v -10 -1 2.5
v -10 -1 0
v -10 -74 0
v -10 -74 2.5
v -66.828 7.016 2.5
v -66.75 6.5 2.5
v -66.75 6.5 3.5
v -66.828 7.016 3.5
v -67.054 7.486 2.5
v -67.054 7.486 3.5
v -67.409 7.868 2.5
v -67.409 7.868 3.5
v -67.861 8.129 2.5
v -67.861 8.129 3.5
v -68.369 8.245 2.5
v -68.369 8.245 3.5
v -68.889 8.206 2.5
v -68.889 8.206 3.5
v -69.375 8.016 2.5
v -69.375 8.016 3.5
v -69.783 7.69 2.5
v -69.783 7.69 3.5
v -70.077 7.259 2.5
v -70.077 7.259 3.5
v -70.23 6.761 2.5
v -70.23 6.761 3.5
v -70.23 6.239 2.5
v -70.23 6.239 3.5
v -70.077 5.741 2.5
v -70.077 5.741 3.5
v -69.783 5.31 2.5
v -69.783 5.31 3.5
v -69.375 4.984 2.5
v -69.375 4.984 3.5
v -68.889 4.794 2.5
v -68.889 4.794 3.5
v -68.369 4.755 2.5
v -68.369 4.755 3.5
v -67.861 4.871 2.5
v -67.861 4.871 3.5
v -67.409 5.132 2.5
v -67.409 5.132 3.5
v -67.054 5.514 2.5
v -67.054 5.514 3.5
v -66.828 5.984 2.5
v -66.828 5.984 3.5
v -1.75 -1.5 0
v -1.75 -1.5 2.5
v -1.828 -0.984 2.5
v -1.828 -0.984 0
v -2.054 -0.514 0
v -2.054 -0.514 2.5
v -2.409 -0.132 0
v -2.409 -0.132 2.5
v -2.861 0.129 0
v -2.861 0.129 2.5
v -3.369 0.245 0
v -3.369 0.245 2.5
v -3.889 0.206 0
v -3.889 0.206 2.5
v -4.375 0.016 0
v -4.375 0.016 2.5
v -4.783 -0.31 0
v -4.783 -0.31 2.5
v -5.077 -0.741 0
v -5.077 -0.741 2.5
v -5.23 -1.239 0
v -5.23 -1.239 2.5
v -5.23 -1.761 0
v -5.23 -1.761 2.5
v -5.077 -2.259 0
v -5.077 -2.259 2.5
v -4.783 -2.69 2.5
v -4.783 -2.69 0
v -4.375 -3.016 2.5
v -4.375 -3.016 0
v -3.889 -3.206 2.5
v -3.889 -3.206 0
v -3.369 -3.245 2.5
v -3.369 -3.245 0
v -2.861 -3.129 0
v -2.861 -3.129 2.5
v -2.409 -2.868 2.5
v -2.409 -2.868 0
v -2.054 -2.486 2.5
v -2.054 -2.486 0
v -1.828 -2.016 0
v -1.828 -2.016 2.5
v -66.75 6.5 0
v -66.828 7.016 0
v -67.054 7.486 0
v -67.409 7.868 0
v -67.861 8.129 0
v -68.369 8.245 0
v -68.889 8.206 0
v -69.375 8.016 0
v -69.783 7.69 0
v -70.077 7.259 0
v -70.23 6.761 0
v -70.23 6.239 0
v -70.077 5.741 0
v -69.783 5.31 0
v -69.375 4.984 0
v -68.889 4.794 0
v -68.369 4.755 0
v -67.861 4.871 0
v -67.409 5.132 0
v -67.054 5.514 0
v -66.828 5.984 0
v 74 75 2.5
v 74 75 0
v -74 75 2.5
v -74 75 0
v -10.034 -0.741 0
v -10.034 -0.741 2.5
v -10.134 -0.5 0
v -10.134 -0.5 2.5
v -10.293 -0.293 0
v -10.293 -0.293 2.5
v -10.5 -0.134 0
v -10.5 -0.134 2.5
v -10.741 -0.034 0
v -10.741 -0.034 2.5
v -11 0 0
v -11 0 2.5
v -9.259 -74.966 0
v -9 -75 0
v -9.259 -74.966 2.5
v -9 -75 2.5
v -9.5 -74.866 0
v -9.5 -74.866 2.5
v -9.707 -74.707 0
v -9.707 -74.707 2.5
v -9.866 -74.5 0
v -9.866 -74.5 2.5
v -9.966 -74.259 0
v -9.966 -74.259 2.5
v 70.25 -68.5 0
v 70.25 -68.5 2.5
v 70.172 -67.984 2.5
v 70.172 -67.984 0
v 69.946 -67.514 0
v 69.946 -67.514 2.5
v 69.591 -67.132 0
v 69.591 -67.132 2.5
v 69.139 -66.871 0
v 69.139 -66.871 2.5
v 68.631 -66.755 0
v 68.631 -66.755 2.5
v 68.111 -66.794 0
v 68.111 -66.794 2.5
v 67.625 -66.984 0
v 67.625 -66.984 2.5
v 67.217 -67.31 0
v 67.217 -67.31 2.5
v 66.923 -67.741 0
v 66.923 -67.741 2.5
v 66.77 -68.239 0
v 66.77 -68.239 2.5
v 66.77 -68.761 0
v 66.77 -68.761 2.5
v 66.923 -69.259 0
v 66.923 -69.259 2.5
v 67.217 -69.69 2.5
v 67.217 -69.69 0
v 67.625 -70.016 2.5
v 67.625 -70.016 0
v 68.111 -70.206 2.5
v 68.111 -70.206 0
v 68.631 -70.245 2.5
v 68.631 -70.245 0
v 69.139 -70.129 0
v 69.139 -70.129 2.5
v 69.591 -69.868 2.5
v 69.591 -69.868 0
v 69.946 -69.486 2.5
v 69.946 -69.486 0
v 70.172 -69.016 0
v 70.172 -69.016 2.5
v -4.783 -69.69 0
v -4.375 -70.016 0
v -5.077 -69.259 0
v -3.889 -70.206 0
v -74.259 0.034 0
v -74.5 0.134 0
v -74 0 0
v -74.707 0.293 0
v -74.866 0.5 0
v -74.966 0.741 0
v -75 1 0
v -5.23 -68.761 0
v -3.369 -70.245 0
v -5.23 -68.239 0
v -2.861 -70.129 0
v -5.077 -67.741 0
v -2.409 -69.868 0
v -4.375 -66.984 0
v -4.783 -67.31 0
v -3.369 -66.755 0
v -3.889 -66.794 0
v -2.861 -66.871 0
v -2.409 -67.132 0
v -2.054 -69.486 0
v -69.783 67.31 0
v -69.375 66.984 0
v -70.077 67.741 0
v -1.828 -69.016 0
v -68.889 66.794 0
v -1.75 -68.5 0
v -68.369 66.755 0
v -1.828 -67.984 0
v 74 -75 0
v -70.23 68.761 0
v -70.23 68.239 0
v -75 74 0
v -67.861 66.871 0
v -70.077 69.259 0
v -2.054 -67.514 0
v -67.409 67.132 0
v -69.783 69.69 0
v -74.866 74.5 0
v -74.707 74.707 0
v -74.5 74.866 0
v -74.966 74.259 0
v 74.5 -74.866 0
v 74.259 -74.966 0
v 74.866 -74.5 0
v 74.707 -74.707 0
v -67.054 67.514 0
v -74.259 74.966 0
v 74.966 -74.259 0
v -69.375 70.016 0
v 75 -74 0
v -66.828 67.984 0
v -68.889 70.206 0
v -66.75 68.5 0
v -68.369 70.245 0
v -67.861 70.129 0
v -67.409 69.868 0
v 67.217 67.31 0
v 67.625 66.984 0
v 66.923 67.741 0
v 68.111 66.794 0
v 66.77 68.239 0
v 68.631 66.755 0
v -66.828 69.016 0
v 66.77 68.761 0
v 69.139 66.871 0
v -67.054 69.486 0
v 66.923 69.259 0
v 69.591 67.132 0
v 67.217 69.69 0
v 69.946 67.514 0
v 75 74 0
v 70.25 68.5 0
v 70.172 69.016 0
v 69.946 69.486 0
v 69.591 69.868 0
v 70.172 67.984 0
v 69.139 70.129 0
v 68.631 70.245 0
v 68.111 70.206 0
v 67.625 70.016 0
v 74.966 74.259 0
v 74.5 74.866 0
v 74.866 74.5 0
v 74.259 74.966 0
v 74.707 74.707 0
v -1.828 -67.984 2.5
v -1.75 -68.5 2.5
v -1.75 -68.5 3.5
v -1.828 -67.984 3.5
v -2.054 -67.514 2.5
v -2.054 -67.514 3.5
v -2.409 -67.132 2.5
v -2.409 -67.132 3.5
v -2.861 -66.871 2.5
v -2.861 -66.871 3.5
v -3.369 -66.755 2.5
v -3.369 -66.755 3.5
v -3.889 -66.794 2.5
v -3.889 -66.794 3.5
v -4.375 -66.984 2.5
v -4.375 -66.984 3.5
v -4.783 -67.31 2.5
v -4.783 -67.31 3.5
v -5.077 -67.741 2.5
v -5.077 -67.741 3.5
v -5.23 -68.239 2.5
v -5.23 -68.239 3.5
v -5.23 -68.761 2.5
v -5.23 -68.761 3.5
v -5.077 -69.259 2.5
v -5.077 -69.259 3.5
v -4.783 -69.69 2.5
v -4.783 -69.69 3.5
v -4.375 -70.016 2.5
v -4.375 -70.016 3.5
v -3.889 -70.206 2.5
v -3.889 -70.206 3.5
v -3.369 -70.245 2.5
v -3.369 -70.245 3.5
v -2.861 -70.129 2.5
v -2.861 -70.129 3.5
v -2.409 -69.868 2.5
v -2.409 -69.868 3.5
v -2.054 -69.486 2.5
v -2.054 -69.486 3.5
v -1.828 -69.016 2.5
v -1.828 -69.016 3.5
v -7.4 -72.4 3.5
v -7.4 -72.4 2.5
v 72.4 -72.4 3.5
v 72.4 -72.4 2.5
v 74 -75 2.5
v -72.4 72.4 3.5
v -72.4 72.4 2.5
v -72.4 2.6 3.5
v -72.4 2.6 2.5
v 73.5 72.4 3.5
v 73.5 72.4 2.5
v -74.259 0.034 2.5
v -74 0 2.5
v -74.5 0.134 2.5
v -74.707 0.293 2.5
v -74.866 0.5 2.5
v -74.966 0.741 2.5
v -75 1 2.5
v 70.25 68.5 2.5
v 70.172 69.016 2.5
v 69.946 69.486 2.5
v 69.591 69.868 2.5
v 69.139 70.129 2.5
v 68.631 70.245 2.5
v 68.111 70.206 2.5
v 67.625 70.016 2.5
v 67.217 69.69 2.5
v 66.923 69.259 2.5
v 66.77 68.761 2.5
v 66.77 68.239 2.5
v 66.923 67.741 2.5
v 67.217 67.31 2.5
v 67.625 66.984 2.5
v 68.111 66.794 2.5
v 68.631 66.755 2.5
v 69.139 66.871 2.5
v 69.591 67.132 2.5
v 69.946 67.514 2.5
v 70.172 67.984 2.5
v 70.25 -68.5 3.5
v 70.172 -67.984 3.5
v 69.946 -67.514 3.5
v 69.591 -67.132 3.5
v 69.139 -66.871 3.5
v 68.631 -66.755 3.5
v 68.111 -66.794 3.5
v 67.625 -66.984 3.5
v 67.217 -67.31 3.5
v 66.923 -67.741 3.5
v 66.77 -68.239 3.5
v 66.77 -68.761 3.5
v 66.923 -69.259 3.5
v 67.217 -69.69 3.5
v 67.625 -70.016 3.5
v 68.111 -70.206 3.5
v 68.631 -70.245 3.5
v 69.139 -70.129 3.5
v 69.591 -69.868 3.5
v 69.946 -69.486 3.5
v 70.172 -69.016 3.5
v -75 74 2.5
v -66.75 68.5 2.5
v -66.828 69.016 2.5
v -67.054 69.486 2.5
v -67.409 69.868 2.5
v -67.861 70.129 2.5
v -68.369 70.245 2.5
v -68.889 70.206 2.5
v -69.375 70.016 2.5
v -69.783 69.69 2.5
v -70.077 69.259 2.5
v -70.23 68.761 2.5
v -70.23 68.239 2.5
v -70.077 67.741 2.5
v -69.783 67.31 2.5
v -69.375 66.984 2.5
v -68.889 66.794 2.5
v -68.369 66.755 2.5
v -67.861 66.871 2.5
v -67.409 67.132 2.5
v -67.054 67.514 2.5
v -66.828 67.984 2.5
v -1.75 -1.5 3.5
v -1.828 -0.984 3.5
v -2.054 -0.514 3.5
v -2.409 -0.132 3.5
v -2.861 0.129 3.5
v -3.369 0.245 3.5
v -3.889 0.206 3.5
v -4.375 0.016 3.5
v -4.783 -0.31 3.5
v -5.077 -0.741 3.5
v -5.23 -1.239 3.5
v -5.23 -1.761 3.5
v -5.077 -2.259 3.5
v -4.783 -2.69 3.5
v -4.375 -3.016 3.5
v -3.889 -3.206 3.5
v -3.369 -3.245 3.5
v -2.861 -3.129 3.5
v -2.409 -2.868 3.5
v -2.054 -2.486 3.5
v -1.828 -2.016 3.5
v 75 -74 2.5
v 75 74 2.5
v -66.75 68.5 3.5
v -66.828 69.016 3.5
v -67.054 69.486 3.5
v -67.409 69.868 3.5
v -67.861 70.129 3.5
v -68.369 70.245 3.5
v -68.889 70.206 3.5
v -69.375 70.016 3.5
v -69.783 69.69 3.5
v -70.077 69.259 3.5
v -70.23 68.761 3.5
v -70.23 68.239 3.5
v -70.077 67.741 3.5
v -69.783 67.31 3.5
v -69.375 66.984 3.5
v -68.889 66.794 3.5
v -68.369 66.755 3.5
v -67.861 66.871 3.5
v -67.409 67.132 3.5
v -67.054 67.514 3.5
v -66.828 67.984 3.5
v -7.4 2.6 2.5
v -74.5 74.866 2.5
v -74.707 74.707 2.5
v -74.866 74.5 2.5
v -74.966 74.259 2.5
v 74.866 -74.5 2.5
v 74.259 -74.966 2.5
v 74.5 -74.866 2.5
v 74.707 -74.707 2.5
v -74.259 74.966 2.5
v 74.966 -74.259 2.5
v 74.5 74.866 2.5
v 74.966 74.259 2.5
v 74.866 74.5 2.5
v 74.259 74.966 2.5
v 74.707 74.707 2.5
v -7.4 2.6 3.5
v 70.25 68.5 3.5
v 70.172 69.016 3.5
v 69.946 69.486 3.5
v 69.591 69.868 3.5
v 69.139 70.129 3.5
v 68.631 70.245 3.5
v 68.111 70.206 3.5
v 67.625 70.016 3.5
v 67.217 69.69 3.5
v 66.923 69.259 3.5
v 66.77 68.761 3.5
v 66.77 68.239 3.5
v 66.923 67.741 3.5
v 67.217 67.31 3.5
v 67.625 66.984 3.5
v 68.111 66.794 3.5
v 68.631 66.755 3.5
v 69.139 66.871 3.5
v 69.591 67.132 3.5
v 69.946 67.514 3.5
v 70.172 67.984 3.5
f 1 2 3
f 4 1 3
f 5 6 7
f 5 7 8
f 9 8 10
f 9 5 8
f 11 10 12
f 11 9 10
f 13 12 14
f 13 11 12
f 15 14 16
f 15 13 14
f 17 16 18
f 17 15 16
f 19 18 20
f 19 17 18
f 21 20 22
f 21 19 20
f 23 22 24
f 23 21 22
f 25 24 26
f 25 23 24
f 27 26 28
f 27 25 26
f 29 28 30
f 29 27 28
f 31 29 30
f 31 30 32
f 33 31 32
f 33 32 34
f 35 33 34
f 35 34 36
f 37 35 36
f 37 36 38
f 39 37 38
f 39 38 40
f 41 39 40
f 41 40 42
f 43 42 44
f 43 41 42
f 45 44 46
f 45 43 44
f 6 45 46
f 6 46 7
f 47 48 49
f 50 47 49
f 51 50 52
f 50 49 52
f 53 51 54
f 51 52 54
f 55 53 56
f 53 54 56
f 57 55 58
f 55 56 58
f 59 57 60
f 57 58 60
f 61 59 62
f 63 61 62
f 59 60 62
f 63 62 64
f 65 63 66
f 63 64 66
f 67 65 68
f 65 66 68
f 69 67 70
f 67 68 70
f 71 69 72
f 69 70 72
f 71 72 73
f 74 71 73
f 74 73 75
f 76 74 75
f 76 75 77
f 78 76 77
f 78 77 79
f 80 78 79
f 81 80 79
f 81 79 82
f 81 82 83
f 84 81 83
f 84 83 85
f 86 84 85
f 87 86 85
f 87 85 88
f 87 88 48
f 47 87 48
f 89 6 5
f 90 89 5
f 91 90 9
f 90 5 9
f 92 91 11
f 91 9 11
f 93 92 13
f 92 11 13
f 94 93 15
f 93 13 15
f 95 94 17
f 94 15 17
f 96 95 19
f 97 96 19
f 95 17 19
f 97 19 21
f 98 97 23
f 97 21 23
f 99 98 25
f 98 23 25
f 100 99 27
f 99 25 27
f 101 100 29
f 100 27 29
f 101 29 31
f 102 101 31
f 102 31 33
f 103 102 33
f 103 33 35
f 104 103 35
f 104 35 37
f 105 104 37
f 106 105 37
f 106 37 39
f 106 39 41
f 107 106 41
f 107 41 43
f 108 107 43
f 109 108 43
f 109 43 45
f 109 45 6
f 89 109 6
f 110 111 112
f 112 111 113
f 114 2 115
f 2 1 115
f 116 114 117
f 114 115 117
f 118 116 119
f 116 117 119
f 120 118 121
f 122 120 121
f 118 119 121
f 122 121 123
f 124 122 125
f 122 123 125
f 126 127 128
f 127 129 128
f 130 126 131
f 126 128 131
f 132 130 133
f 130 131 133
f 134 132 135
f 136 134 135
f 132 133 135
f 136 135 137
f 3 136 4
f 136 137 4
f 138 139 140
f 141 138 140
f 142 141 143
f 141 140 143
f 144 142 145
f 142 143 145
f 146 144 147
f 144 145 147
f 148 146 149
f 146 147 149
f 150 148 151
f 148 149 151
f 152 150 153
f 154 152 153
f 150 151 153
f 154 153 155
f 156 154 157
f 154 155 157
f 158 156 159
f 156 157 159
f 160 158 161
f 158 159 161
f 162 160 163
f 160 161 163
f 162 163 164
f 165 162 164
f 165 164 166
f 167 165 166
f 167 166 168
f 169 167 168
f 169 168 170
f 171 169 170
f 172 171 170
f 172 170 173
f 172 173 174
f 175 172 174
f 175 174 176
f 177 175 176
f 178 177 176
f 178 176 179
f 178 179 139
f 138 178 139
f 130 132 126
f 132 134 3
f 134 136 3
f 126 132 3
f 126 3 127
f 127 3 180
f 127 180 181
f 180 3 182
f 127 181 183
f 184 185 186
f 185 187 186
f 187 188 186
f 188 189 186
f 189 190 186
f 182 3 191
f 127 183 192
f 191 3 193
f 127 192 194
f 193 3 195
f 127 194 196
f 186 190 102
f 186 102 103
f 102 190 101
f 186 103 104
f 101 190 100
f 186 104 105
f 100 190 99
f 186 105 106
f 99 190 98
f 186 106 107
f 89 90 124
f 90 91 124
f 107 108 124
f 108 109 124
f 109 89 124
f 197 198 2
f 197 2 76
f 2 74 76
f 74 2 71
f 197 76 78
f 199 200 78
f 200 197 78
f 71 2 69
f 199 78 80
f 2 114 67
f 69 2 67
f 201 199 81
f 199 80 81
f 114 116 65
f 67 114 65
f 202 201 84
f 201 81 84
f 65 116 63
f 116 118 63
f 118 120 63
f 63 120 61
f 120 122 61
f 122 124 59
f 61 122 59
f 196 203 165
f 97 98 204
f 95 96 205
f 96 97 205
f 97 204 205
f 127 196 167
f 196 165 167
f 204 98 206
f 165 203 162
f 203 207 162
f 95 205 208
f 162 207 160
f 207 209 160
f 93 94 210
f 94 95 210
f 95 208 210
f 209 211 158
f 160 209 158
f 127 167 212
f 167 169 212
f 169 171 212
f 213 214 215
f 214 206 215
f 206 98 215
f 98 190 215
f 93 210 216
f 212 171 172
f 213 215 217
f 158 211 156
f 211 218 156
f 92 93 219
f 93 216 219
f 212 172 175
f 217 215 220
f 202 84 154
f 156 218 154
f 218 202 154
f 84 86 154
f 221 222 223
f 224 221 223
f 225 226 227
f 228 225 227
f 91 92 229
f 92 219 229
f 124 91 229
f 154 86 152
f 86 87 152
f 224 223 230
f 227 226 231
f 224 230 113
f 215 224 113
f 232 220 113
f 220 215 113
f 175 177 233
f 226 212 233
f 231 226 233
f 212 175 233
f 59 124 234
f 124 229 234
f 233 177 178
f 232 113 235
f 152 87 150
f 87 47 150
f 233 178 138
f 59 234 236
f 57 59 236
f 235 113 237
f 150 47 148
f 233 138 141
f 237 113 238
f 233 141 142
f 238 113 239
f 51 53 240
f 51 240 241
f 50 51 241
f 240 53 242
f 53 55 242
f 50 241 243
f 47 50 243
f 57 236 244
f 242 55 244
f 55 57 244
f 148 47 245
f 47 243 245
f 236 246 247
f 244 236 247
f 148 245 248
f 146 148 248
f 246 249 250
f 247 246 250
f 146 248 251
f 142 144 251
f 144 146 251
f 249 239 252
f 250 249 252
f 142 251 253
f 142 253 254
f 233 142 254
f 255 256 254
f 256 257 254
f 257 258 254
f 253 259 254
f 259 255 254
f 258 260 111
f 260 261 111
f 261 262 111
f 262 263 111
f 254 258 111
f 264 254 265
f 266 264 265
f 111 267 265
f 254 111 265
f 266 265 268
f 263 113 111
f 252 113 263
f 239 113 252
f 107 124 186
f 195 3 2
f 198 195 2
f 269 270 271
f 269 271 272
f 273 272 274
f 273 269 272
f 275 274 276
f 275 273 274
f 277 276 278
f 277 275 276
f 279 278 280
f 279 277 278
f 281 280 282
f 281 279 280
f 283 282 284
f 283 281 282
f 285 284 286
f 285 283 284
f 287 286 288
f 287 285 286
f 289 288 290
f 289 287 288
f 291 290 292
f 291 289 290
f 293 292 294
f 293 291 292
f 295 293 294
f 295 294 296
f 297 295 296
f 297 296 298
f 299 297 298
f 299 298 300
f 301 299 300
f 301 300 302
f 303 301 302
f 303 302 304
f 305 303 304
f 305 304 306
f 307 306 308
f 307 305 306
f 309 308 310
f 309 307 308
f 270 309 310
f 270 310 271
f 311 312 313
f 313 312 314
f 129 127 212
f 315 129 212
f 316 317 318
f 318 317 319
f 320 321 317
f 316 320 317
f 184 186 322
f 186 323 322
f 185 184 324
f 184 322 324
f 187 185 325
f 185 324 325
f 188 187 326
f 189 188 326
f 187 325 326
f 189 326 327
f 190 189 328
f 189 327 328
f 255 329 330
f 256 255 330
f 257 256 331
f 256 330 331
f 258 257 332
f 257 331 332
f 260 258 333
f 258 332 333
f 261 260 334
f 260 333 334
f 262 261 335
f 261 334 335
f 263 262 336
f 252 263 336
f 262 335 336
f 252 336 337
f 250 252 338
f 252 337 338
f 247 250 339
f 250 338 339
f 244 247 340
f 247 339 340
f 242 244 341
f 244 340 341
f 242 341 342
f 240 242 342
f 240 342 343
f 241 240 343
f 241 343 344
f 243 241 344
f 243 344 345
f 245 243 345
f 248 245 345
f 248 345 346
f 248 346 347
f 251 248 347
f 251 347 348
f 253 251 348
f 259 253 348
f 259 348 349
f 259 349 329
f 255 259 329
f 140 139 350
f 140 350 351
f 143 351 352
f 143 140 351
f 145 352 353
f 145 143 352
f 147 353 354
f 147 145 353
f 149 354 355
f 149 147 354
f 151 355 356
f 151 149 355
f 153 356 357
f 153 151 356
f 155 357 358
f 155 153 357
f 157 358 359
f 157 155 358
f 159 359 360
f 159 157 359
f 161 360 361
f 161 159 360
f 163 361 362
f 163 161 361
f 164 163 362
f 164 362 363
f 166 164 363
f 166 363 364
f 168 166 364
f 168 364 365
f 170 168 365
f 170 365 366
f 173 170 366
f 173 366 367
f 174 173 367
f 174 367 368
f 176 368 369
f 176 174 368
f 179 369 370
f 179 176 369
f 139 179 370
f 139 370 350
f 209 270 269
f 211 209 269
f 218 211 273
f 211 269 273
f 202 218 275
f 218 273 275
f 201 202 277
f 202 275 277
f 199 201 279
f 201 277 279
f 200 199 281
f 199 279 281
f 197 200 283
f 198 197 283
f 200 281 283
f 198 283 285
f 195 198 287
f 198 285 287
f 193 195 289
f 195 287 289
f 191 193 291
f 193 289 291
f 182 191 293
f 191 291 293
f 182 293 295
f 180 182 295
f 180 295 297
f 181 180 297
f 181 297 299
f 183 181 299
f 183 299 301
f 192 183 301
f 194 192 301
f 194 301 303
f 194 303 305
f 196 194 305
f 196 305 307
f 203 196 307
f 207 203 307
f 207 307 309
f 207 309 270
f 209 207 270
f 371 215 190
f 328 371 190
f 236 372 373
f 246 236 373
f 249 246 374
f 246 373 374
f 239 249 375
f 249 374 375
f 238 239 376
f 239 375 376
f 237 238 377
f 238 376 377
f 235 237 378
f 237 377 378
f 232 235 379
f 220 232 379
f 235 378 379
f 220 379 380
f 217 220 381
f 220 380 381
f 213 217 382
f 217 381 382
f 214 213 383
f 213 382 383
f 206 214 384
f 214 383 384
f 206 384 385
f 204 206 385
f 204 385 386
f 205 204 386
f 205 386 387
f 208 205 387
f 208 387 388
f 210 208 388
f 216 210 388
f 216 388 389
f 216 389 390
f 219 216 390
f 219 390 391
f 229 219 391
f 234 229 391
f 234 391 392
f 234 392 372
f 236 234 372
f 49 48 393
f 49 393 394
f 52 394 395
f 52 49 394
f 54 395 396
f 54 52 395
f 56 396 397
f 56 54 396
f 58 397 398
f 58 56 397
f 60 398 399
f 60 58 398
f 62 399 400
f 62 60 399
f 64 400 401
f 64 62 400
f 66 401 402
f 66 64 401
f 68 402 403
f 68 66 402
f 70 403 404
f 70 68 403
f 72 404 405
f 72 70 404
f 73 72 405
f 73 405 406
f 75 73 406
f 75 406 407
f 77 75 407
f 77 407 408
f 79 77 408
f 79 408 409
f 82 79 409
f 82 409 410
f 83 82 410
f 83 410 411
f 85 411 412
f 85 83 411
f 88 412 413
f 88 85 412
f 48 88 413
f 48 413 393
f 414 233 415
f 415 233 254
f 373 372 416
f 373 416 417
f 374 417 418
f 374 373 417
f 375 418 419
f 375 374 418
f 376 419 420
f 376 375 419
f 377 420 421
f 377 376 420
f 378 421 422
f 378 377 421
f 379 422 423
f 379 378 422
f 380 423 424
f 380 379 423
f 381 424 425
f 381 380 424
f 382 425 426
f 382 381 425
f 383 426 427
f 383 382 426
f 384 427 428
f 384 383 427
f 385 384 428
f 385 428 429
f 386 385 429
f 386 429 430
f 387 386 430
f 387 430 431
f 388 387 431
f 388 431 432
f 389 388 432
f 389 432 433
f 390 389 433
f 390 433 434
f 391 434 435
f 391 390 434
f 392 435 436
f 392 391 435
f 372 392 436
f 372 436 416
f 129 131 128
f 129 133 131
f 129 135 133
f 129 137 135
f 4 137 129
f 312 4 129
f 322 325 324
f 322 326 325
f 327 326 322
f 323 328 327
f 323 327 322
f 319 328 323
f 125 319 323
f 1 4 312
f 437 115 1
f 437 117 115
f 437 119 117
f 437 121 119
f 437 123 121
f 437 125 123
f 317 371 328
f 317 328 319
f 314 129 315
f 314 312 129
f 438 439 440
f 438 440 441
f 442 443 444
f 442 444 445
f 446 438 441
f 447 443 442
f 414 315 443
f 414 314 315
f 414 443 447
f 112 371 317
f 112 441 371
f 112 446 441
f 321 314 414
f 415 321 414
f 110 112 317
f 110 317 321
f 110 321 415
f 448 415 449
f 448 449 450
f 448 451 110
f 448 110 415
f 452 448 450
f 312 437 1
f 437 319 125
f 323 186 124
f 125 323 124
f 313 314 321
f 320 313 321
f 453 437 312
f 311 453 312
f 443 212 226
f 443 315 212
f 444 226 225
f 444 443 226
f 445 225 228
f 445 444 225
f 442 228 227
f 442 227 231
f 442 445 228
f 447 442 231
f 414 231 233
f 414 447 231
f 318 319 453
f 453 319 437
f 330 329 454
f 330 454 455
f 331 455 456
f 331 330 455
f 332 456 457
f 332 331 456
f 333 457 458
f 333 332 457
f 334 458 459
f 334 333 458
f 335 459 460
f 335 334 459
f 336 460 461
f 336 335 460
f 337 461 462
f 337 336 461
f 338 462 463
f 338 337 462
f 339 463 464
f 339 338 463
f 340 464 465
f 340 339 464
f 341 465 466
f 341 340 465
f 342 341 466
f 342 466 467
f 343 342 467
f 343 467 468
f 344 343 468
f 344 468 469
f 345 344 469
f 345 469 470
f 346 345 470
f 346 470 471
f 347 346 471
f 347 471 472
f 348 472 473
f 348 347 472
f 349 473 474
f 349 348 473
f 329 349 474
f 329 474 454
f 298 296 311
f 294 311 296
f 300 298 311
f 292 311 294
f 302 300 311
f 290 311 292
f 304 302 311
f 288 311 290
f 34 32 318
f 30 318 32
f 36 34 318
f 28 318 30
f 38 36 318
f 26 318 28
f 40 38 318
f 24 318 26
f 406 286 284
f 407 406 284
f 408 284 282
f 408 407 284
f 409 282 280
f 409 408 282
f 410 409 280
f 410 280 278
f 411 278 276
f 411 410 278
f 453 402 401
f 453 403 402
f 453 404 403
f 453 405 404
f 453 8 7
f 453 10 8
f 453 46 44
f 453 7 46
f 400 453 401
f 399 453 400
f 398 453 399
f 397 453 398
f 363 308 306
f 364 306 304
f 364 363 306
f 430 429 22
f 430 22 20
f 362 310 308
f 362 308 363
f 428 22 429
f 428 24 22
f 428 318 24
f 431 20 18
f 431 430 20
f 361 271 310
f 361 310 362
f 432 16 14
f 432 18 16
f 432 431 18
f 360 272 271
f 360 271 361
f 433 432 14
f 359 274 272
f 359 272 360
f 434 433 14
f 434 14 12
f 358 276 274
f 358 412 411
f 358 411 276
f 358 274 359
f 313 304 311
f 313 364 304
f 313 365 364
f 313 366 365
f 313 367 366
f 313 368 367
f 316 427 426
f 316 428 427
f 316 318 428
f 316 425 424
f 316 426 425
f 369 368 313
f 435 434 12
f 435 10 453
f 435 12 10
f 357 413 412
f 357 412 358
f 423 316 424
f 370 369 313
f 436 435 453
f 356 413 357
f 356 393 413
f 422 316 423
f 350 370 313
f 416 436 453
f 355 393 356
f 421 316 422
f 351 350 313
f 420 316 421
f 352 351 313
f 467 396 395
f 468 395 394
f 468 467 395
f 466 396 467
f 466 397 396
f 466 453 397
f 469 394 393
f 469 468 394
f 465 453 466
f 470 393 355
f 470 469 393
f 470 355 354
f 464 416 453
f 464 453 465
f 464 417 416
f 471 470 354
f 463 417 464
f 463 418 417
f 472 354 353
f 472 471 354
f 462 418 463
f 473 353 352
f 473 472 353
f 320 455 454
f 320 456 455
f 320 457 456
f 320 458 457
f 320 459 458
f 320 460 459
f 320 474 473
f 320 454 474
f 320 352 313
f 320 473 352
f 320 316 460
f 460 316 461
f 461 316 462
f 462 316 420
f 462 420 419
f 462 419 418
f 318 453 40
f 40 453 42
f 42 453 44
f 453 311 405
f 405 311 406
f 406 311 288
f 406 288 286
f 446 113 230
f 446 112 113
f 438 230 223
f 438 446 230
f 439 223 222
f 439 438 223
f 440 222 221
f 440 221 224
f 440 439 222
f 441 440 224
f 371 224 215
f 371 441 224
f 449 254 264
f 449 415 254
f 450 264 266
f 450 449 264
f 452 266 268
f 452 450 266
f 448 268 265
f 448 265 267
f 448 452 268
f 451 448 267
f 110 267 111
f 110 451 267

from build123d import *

# Parameters (mm, degrees)
F1_DEPTH = 2.5
F2_R     = 1.75
F3_DEPTH = 3.5
F4_DEPTH = 1
F5_R     = 1


with BuildPart() as f1:
    # F0 (on Top) → F1 (new body)
    with BuildSketch(Plane.XY):
        Polygon((-10, -75), (75, -75), (75, 75), (-75, 75), (-75, 0), (-10, 0), align=None)
    extrude(amount=F1_DEPTH)

    # F2 (on face) → F3 (cut)
    with BuildSketch(Plane.XY.offset(2.5)):
        with Locations((-68.5, 68.5)):
            Circle(F2_R)
        with Locations((68.5, 68.5)):
            Circle(F2_R)
        with Locations((68.5, -68.5)):
            Circle(F2_R)
        with Locations((-3.5, -68.5)):
            Circle(F2_R)
        with Locations((-68.5, 6.5)):
            Circle(F2_R)
        with Locations((-3.5, -1.5)):
            Circle(F2_R)
    extrude(amount=-F3_DEPTH, mode=Mode.SUBTRACT)

    # F2 (on face) → F4 (join)
    with BuildSketch(Plane.XY.offset(2.5)):
        Polygon((73.5, 72.4), (-72.4, 72.4), (-72.4, 2.6), (-7.4, 2.6), (-7.4, -72.4), (72.4, -72.4), align=None)
        with Locations((-3.5, -68.5)):
            Circle(F2_R, mode=Mode.SUBTRACT)
        with Locations((-3.5, -1.5)):
            Circle(F2_R, mode=Mode.SUBTRACT)
        with Locations((68.5, -68.5)):
            Circle(F2_R, mode=Mode.SUBTRACT)
        with Locations((-68.5, 6.5)):
            Circle(F2_R, mode=Mode.SUBTRACT)
        with Locations((-68.5, 68.5)):
            Circle(F2_R, mode=Mode.SUBTRACT)
        with Locations((68.5, 68.5)):
            Circle(F2_R, mode=Mode.SUBTRACT)
    extrude(amount=F4_DEPTH)

    # F5
    f5_edges = [f1.edges().sort_by_distance(p)[0] for p in [
        (-10, 0, 1.25),
        (-10, -75, 1.25),
        (75, -75, 1.25),
        (75, 75, 1.25),
        (-75, 75, 1.25),
        (-75, 0, 1.25),
    ]]
    fillet(f5_edges, radius=F5_R)


solid = f1.part
